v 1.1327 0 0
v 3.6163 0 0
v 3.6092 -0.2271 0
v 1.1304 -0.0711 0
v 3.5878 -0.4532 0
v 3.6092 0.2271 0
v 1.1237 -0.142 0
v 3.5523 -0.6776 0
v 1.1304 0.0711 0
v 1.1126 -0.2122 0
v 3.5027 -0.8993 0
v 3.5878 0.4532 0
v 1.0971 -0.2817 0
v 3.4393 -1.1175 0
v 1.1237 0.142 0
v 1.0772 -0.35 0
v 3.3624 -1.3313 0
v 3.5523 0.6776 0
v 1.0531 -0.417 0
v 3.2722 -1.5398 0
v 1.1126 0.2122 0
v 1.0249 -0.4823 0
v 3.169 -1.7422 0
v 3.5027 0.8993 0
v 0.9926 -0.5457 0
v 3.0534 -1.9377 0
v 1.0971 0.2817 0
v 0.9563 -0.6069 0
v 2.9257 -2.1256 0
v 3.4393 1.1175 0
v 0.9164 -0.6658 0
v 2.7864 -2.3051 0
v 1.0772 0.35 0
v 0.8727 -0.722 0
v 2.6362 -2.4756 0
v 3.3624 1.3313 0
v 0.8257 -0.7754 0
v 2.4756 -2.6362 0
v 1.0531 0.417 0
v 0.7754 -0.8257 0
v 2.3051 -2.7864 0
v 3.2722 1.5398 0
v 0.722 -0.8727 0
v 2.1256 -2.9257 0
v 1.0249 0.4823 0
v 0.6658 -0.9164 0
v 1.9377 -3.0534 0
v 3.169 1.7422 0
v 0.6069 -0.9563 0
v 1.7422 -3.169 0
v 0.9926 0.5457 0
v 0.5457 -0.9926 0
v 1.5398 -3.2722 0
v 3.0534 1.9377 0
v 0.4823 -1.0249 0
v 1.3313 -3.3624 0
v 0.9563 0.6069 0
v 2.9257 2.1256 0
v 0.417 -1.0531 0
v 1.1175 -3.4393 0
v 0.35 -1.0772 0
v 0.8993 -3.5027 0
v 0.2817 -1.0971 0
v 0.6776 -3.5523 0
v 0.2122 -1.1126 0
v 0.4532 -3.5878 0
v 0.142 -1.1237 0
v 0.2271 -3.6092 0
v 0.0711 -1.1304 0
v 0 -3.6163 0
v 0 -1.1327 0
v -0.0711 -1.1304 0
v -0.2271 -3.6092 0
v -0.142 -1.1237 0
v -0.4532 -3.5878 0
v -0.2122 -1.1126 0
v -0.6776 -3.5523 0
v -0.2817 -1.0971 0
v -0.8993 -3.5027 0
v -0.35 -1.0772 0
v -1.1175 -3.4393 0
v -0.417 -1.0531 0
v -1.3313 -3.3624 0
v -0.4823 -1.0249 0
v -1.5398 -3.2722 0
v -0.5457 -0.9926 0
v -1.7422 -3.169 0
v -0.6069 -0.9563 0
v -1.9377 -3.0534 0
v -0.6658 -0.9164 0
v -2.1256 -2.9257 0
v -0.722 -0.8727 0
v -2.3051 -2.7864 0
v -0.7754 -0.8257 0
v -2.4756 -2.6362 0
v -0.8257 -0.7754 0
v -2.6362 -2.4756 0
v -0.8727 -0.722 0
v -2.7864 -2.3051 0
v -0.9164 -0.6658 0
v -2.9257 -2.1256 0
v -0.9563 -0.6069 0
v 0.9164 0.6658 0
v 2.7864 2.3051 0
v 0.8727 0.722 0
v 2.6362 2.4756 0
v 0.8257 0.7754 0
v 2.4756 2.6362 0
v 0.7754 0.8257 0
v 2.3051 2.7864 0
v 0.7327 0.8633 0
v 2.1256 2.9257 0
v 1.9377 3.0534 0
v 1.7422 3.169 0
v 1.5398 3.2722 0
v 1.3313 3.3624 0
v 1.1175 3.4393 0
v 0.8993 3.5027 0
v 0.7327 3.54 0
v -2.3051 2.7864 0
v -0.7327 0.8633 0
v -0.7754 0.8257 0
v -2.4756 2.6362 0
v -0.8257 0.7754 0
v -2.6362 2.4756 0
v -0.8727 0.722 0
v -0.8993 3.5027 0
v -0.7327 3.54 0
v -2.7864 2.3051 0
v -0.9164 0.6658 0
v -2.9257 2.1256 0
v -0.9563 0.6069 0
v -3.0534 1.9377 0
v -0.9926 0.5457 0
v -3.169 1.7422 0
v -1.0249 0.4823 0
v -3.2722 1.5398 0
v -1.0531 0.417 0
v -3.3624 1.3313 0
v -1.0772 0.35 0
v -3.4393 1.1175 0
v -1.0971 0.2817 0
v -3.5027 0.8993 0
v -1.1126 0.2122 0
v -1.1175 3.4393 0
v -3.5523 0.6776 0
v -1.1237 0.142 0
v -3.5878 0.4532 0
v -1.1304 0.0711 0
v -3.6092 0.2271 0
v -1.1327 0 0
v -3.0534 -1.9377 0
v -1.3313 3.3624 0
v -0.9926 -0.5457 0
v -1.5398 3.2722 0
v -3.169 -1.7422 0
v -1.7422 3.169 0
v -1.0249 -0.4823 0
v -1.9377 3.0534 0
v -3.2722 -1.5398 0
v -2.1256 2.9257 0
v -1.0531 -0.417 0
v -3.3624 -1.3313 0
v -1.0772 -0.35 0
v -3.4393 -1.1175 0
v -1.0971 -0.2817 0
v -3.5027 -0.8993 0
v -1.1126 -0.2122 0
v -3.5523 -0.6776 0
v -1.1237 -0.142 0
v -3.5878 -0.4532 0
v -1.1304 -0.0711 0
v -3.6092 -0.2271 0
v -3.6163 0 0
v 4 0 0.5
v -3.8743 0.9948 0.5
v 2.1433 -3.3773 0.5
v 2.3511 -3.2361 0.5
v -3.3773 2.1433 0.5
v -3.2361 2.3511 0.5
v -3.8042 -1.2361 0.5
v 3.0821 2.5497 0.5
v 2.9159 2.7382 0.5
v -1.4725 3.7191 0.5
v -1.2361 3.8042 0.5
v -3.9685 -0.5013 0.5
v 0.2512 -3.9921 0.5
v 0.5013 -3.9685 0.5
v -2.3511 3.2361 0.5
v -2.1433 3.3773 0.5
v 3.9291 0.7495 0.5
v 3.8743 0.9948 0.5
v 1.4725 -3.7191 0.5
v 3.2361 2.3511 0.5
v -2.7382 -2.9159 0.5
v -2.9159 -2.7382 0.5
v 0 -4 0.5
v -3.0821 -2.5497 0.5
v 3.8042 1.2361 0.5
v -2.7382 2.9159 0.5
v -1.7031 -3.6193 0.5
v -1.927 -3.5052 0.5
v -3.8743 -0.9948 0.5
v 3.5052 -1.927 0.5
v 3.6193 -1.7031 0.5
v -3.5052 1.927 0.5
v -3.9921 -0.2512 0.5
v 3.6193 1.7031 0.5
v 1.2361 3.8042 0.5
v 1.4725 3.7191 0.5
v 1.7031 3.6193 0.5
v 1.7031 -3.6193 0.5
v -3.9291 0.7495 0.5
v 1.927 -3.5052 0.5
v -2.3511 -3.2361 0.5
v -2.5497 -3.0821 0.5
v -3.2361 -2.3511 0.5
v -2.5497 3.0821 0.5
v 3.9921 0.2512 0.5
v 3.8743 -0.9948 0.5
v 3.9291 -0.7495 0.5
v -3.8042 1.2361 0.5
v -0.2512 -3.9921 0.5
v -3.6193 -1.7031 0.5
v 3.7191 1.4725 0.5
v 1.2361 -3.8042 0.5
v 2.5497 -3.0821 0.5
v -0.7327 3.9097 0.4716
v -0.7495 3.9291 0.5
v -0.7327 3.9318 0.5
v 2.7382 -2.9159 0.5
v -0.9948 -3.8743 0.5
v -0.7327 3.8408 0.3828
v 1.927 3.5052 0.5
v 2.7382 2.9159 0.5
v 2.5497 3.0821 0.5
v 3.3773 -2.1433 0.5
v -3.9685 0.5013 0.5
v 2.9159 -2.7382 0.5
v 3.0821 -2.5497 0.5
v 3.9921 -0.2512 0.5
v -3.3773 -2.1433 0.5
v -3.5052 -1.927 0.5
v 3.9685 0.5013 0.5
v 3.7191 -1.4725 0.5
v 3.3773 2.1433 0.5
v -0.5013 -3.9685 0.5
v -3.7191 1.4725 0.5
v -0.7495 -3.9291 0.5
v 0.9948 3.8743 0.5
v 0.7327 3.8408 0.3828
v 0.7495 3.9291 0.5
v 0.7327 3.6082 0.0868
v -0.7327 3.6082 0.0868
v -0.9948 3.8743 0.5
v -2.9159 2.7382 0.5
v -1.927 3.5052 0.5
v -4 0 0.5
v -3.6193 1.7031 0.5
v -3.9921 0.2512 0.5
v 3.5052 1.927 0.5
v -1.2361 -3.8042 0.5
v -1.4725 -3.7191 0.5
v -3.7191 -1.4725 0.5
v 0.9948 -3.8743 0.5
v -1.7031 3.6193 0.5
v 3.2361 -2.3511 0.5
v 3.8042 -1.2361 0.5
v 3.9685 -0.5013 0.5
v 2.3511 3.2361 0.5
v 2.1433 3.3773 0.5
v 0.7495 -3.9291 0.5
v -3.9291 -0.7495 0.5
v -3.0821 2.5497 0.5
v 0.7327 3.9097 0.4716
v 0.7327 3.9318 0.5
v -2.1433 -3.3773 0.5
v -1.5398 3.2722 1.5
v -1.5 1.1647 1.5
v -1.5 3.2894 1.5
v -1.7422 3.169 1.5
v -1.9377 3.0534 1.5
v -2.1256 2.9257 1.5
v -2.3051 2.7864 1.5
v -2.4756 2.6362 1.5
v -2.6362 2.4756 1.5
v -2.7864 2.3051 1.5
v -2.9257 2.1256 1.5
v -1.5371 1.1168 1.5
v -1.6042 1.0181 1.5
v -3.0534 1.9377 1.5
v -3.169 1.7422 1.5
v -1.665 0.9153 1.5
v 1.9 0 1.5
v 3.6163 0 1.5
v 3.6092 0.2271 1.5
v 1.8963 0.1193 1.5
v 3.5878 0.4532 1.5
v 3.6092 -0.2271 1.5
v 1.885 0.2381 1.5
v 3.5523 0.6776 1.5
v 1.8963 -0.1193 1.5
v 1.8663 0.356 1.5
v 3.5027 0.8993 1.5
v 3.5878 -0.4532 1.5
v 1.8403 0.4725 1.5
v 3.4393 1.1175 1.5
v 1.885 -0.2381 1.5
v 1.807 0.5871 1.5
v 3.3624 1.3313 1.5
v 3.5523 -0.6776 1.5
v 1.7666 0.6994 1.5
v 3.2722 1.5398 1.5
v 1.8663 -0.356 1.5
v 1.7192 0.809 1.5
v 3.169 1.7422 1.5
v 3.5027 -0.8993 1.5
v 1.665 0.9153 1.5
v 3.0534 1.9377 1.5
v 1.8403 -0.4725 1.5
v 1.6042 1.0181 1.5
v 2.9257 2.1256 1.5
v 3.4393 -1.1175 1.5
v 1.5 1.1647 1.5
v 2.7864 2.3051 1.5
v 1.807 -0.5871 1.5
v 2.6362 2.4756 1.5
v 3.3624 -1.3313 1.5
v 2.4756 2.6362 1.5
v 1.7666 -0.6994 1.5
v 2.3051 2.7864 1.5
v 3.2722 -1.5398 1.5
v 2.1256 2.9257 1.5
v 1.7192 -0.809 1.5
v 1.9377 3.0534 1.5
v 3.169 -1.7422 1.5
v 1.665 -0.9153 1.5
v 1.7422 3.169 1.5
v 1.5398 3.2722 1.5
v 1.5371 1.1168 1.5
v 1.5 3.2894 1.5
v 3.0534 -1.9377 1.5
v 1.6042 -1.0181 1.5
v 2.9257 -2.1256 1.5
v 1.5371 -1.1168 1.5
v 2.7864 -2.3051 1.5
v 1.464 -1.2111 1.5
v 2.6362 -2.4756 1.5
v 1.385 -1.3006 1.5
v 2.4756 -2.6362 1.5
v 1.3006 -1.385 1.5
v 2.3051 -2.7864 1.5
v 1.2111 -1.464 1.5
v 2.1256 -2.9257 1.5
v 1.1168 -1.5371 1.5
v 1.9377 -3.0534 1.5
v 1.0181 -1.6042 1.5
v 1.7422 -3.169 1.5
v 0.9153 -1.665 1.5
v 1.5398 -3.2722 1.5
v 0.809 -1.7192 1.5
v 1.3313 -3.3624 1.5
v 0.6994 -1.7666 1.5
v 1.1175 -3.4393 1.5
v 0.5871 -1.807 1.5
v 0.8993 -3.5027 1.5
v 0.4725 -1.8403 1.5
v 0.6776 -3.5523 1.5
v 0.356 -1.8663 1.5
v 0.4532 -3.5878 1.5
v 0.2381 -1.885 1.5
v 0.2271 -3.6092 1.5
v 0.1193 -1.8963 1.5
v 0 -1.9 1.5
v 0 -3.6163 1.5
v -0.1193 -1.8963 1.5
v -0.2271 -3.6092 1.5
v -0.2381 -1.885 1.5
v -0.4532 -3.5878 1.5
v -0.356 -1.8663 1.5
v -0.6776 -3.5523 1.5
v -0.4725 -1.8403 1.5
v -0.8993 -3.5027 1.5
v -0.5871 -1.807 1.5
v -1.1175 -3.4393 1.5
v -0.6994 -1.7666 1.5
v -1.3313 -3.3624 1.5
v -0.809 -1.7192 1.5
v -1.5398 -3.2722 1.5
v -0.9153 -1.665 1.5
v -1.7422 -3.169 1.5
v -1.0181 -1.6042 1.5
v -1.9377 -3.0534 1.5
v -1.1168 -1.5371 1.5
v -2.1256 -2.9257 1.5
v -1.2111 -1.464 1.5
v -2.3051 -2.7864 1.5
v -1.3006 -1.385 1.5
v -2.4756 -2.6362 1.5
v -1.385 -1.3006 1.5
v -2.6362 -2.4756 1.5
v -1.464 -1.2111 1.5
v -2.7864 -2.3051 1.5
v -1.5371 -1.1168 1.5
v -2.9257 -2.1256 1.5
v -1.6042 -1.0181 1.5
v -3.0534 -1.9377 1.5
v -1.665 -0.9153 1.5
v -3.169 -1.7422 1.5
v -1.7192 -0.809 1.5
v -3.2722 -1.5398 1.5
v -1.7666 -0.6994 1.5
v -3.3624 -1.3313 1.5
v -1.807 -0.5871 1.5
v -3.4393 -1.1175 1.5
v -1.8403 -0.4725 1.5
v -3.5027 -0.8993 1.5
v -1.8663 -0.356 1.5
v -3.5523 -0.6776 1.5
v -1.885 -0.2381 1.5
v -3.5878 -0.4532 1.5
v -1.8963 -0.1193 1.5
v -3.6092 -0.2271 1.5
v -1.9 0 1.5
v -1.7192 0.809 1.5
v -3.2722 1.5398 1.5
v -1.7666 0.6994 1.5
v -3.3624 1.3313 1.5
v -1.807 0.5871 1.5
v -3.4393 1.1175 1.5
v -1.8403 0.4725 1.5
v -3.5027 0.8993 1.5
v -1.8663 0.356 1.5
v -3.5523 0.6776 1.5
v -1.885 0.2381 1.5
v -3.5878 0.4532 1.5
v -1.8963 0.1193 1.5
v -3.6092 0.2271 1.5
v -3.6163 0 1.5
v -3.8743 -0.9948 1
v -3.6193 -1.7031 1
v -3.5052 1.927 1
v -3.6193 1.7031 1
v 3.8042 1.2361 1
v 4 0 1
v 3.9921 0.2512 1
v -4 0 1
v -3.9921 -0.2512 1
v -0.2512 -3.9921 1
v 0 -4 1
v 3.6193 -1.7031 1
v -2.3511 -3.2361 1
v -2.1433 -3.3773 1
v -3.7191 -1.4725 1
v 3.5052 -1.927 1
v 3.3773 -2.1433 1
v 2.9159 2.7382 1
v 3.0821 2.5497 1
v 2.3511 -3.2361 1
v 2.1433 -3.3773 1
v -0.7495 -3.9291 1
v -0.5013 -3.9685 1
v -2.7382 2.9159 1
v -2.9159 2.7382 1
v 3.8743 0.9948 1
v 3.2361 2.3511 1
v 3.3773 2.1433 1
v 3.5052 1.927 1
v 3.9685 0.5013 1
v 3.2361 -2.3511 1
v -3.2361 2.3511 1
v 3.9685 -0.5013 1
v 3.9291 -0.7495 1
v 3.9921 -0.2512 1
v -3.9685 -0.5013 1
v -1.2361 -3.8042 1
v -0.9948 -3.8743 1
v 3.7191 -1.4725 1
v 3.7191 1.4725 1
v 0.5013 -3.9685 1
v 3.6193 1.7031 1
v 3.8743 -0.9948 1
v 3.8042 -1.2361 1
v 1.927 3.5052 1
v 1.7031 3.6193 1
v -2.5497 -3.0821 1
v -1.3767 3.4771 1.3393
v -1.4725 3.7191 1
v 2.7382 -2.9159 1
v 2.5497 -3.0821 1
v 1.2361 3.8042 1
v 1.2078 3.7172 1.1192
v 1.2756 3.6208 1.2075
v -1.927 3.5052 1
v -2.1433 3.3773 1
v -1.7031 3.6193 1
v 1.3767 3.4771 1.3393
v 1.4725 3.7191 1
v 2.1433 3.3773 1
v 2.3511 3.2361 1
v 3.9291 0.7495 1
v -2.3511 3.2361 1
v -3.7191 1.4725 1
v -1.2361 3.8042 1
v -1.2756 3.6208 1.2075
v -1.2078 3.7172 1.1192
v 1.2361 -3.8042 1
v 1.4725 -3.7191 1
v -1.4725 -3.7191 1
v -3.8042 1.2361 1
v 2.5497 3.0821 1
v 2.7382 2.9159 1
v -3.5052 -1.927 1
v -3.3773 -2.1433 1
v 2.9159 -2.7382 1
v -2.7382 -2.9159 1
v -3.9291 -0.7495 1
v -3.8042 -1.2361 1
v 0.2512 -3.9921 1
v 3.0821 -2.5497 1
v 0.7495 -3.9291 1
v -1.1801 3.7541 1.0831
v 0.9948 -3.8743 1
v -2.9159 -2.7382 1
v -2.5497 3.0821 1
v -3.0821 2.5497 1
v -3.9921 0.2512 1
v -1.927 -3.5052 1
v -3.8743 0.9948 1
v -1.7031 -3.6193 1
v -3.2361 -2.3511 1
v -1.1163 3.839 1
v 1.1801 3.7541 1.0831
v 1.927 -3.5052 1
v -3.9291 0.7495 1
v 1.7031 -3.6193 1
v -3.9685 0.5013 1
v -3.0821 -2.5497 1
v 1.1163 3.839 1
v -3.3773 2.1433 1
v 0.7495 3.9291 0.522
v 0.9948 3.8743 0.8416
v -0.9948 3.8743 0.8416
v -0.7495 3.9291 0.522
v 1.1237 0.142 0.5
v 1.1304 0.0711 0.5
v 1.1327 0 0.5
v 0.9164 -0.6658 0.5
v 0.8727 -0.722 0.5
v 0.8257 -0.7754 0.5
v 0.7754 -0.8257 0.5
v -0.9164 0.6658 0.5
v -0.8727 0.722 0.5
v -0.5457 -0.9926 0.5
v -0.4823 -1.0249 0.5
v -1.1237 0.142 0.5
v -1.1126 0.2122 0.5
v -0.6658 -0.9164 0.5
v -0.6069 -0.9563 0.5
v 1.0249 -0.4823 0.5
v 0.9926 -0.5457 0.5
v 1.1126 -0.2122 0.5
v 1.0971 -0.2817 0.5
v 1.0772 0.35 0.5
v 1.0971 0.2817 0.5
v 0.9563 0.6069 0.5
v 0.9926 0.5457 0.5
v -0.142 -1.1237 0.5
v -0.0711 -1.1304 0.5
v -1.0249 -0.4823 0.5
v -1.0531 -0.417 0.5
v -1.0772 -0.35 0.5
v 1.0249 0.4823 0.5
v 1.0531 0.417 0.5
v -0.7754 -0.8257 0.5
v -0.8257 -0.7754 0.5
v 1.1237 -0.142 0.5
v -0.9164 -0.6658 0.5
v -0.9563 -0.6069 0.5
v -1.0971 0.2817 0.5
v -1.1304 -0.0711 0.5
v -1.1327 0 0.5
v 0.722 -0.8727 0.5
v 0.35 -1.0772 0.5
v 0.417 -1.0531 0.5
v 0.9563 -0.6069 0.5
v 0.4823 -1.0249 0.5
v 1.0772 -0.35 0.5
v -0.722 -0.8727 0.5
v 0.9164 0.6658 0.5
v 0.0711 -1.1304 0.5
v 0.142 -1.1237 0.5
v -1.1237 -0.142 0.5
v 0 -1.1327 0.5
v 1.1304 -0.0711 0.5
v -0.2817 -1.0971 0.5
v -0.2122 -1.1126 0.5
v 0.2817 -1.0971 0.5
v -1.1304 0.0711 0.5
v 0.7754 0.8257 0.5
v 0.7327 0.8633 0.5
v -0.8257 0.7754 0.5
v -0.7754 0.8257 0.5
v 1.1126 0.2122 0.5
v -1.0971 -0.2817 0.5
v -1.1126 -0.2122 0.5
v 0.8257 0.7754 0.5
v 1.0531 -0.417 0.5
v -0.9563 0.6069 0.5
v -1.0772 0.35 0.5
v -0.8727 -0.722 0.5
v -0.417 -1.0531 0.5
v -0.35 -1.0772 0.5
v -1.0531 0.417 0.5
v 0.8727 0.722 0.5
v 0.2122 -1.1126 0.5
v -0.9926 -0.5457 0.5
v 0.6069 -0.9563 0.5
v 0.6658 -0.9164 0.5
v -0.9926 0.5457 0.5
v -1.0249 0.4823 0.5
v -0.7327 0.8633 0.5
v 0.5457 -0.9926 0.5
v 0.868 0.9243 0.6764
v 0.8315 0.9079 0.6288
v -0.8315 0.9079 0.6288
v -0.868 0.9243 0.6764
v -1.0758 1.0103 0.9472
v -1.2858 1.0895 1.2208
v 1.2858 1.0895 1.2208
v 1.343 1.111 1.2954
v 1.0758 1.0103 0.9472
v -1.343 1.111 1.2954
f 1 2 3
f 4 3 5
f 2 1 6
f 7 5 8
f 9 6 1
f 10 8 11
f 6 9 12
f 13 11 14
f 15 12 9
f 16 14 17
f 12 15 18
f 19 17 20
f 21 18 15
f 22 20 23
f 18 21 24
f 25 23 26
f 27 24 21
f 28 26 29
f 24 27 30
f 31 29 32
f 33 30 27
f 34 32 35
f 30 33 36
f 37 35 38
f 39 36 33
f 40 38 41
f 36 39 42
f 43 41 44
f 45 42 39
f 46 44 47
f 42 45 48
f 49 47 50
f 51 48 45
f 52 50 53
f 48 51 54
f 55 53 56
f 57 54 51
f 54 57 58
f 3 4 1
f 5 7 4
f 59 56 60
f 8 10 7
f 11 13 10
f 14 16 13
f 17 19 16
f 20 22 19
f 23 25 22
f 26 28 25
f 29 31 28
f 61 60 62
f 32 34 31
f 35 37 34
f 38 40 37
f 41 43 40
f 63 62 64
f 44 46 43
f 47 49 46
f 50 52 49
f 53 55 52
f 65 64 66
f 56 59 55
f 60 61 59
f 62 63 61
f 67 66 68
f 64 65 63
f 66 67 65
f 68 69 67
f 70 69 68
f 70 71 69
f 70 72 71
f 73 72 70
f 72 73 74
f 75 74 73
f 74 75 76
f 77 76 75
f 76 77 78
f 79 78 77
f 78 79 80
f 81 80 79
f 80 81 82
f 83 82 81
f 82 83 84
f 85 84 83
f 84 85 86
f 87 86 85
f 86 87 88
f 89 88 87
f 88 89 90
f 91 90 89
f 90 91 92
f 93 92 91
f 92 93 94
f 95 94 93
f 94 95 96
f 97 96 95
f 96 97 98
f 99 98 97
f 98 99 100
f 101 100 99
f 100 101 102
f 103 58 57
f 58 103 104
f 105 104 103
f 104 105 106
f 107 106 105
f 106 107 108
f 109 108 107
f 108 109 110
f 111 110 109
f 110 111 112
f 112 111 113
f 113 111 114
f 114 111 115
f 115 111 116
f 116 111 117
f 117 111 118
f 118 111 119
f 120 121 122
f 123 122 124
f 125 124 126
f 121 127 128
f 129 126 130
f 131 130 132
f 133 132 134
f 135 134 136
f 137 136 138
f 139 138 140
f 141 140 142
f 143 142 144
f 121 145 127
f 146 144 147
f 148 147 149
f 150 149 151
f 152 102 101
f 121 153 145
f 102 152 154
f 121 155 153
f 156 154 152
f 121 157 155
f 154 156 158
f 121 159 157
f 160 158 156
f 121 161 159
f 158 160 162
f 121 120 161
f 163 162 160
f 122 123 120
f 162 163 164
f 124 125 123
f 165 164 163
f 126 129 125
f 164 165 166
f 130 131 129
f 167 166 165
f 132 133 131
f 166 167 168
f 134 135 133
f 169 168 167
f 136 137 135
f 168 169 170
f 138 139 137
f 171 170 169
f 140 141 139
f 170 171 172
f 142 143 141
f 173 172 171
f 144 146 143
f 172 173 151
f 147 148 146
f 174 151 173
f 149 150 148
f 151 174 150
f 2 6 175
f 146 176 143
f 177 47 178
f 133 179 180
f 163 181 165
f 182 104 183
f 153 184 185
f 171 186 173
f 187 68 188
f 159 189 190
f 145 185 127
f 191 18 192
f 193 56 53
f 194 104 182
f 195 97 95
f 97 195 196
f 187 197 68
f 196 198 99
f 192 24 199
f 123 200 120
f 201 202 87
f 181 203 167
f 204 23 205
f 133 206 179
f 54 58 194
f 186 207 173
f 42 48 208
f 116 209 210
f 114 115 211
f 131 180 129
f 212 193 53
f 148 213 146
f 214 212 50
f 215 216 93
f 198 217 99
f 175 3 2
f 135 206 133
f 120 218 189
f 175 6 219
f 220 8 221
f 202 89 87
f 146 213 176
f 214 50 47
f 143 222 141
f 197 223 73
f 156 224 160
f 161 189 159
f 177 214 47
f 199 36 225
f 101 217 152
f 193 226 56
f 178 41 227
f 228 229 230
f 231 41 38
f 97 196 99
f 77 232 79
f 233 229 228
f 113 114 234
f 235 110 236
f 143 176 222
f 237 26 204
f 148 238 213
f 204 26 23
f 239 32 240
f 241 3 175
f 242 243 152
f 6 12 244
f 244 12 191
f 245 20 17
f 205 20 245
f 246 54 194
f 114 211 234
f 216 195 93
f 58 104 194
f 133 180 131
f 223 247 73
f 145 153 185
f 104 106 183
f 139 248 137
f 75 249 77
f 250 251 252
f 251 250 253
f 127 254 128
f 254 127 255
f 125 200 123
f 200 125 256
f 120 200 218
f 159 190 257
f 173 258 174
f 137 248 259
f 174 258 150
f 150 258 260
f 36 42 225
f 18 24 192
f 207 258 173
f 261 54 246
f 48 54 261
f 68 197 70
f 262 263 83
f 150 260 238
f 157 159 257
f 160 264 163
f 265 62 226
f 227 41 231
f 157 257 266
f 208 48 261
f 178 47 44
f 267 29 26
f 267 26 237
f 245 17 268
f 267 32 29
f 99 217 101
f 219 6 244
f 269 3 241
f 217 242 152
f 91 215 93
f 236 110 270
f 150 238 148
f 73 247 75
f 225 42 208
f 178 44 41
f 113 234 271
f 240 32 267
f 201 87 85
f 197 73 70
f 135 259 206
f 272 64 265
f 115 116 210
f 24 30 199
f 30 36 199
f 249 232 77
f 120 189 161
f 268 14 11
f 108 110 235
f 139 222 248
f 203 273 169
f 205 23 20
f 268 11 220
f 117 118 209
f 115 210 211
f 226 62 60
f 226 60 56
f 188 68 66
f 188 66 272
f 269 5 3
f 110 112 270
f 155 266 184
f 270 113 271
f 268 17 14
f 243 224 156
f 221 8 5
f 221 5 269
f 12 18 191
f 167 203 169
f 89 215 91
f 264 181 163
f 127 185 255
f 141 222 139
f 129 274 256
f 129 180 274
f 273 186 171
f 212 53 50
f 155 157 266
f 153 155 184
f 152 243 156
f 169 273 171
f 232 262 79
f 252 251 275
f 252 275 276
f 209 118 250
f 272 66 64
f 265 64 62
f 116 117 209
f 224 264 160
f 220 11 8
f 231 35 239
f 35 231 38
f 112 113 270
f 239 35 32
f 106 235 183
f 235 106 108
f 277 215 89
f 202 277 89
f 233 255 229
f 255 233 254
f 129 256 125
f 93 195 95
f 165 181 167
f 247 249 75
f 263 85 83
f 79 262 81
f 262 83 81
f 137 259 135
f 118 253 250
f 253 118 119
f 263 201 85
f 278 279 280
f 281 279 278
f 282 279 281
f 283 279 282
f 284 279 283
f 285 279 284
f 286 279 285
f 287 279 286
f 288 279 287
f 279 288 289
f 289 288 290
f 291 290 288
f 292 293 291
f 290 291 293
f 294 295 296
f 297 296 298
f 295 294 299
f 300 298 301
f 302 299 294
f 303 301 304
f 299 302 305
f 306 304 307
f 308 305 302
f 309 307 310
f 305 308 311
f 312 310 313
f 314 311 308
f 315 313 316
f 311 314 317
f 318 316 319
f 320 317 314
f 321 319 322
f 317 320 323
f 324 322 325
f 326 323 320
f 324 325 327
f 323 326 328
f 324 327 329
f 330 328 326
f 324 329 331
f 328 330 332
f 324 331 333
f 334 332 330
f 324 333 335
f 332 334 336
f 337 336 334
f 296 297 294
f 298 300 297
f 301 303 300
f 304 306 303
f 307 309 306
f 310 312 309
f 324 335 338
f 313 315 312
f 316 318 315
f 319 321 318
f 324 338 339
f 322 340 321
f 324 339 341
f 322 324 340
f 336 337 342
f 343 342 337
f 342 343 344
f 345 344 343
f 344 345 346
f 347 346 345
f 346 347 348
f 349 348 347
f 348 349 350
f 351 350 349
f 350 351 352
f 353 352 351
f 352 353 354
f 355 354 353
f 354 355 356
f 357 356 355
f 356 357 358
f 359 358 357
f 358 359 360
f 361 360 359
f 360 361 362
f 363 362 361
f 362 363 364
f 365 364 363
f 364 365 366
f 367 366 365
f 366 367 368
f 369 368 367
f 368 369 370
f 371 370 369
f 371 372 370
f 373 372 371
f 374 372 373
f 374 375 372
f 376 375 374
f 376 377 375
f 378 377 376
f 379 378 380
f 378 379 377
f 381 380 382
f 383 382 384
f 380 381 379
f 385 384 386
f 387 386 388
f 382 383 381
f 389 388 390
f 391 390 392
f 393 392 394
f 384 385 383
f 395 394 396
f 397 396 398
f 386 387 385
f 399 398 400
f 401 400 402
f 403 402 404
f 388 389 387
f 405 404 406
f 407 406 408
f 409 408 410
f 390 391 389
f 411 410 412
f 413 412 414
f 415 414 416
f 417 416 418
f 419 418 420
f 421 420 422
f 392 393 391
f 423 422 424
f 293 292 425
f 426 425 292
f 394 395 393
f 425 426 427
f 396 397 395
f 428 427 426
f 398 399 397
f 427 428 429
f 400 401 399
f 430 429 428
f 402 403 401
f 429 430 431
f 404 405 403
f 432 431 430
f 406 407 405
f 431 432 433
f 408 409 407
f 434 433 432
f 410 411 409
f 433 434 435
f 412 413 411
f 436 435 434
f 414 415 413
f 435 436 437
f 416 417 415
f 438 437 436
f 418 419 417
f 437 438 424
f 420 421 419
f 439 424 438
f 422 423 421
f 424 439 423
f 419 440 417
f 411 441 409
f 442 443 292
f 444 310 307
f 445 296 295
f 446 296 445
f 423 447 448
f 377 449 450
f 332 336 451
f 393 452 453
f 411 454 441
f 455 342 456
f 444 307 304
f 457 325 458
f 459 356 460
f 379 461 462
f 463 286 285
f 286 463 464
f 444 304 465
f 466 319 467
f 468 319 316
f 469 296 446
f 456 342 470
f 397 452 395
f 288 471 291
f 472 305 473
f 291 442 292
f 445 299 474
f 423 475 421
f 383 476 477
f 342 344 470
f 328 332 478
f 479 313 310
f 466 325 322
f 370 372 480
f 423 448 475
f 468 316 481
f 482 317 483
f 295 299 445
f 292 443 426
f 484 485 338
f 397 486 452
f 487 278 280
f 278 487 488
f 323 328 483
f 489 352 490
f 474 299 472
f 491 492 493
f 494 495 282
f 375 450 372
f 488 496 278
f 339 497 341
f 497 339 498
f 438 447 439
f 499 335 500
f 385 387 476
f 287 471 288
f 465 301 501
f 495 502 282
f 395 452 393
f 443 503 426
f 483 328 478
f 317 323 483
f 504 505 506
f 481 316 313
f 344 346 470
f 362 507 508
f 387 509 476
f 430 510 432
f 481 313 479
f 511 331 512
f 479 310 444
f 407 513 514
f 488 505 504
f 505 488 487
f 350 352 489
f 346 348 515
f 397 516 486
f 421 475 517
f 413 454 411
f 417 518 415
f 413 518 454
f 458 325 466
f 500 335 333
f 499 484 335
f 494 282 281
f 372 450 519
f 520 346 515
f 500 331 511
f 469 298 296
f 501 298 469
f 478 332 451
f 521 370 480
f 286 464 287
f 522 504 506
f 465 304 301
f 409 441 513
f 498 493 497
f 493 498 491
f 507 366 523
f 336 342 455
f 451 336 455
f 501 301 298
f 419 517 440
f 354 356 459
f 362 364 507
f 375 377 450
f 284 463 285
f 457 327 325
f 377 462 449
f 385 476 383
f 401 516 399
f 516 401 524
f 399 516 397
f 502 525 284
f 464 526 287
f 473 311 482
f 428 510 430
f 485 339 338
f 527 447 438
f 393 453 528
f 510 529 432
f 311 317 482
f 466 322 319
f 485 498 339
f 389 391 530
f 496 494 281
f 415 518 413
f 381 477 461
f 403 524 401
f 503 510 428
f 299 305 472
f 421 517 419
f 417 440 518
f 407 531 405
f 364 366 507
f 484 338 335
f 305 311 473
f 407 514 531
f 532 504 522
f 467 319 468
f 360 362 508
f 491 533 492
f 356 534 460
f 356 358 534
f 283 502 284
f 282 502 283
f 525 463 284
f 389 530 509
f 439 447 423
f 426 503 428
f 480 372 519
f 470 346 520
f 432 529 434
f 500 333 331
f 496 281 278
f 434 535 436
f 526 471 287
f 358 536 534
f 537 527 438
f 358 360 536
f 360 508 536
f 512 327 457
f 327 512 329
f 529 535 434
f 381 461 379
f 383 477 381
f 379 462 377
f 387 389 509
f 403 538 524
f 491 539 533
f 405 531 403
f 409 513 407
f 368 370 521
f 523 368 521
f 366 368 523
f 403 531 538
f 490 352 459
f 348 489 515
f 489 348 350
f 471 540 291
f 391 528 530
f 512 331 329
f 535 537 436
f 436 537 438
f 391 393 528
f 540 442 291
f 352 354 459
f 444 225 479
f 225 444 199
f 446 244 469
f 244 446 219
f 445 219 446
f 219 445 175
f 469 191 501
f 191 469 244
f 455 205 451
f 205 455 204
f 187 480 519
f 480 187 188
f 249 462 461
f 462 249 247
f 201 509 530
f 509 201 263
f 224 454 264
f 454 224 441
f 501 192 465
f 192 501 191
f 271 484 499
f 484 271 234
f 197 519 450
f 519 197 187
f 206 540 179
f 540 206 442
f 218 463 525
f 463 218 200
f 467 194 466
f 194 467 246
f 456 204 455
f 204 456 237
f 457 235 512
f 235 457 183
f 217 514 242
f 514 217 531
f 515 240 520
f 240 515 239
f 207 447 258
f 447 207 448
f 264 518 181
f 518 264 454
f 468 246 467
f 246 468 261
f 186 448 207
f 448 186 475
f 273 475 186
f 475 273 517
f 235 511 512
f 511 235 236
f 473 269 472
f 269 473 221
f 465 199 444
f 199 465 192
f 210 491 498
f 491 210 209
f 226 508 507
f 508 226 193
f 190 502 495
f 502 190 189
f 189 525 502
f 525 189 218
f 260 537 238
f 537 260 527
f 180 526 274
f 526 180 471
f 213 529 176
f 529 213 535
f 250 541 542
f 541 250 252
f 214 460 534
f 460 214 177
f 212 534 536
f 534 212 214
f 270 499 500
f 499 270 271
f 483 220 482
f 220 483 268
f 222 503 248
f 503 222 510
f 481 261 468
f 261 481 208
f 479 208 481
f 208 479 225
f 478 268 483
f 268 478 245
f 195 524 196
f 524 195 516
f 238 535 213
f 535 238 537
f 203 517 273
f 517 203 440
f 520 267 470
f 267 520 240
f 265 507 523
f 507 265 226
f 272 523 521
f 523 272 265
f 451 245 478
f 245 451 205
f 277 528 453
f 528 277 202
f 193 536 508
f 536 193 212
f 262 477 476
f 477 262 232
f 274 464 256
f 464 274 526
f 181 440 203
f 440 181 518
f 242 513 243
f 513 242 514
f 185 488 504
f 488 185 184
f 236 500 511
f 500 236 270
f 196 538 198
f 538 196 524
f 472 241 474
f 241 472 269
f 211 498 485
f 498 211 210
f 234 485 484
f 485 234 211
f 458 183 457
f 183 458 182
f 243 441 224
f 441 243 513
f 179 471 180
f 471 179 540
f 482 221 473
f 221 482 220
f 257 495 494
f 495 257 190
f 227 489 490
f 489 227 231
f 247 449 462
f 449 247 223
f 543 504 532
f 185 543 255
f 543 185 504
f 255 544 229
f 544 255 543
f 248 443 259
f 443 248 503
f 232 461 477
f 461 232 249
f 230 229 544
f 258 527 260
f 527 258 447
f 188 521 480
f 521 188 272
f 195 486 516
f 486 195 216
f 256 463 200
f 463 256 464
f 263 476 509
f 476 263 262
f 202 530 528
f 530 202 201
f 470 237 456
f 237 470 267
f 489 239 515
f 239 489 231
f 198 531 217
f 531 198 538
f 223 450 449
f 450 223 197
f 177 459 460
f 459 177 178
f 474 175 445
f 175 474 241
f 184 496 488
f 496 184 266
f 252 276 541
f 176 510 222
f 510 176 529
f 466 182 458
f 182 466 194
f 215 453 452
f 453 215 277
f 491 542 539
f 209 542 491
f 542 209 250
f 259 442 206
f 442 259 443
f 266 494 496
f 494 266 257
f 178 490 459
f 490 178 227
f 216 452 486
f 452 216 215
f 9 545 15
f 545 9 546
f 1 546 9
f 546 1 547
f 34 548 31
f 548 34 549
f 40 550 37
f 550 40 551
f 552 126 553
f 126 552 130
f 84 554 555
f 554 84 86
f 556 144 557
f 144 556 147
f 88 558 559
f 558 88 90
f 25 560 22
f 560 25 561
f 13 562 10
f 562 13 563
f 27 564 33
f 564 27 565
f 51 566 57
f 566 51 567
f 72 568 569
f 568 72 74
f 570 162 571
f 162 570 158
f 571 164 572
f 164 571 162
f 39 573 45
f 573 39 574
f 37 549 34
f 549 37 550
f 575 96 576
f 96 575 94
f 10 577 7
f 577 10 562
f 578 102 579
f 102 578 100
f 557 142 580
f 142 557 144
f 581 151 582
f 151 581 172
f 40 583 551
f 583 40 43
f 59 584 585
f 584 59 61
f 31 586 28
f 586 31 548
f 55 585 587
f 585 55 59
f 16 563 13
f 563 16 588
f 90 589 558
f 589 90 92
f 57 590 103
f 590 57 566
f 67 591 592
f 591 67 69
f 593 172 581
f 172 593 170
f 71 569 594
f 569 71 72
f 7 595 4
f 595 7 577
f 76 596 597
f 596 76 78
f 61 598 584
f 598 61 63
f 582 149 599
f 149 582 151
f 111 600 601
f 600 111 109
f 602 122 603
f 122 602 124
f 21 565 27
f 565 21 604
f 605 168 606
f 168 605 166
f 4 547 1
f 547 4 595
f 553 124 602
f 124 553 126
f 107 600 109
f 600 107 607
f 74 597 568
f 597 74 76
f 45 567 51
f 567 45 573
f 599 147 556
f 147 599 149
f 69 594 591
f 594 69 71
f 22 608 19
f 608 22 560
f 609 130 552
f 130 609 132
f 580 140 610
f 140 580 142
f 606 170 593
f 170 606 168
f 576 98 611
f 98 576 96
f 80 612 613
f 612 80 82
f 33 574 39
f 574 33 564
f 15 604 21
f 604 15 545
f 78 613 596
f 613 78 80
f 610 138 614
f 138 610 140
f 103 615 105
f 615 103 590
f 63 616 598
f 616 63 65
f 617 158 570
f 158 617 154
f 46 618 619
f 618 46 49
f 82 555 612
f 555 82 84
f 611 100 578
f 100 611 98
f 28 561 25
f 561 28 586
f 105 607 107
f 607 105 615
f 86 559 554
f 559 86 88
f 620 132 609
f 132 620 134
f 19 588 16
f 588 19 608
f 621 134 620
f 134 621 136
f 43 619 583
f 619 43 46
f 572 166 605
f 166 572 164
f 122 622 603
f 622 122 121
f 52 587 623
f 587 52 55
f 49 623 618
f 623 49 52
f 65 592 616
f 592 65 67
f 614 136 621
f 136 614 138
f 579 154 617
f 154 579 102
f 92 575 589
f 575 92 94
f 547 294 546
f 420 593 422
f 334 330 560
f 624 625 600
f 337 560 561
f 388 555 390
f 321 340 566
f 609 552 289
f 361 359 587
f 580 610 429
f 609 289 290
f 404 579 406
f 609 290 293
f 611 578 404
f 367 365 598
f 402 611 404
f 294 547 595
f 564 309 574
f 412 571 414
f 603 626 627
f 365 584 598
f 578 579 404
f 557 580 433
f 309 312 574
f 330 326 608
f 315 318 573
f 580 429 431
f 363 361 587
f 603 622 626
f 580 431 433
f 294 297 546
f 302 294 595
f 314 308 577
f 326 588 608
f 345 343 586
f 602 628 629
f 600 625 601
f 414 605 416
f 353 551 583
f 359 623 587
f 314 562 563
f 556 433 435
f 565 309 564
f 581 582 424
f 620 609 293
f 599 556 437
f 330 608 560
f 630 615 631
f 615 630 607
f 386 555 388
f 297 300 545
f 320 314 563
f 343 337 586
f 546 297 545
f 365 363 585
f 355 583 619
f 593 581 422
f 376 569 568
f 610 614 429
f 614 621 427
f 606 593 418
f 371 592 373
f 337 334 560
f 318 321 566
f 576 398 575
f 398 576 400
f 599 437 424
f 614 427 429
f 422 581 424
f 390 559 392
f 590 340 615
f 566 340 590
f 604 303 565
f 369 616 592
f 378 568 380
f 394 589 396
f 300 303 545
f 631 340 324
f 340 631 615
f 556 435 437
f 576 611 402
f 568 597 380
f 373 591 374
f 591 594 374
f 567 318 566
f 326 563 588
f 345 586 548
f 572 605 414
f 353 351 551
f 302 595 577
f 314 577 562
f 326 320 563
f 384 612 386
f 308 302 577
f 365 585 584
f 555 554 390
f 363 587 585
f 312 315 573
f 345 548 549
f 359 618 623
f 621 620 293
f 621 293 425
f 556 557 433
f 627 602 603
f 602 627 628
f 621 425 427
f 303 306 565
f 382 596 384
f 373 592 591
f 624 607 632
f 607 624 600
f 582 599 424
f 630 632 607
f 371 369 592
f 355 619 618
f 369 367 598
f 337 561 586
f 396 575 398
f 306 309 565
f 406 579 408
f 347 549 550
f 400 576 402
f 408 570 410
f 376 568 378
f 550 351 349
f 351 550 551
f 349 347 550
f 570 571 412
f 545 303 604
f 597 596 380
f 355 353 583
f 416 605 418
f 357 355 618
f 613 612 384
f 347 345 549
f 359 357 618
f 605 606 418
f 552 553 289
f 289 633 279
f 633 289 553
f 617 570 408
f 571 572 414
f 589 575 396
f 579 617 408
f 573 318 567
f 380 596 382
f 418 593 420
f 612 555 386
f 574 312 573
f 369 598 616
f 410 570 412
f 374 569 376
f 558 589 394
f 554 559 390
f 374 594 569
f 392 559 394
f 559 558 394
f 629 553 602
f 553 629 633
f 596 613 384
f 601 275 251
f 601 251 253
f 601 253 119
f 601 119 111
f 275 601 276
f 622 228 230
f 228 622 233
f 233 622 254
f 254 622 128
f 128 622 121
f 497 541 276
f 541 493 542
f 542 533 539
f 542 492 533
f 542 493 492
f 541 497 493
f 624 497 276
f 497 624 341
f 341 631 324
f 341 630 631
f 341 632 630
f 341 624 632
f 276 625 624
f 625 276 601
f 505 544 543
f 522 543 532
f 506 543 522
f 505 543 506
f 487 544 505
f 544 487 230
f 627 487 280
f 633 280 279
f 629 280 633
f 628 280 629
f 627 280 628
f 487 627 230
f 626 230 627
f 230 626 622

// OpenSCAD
//Outer radius of the peg the clip will attach to
pegRadius = 1.75;
//Clearance between the peg and the inner radius of the clip
clearance = .15;
//Outer radius of the clip.  If it's less than or equal to your peg radius, your clip isn't going to hold much.
outerRadius = 4;
//Thickness of the clip.
thickness = 1.5;
//Bevel angle from vertical of the clip and peg notch.  The steeper the angle, the more holding power and thinner notch in your peg, but the harder it is to print the peg without support.  Supports are bad.
bevelAngle = 37.5;
//Thickness of the clip before it starts beveling.  This can be 0 for a sharp-edged clip, or greater than the thickness for a clip with no bevel at all.
bevelStart = .5;
//This is how much the "wings" overlap the solid portion of the peg.  Too much and your clip may not be flexible enough to open and go into place.  Less than clearance and the clip can just fall off.  You only need enough wraparound to keep the clip from coming off during normal useage and still be removable by hand (or tool).
wrapAround = .4;
//This chamfers the outside edge, easing the top and bottom corners and making removal from the bed easier.
chamferAngle = 37.5;
chamferHeight = .5;

offset = ((thickness-bevelStart) / tan((90-bevelAngle)));

innerRadius = (pegRadius - offset) + clearance;
iR2 = innerRadius + offset;
//1.56321 - .1;

chamferWidth = (chamferHeight) / tan(90-chamferAngle);

//Number of sides to make it "round".  I like very round, so I use 100, but less round renders faster.
$fn=100;

//jump = 10*ceil(outerRadius * 3 / 10);

difference() {
	cylinder(
		h=thickness,
		r=outerRadius
	);
	cylinder(
		h=thickness,
		r=innerRadius
	);
	translate([0, 0, bevelStart]){
		cylinder(
			h=thickness - bevelStart,
			r1=innerRadius,
			r2=iR2
		);
	};
	translate([0, outerRadius/2, thickness/2]) {
		cube(
			size=[(innerRadius-wrapAround)*2,outerRadius,thickness],
			center=true
		);
	};
	polyhedron(
		points=[
			[-(innerRadius-wrapAround), 0, bevelStart],
			[-(innerRadius-wrapAround + offset), 0, thickness],
			[(innerRadius-wrapAround)+offset, 0, thickness],
			[innerRadius-wrapAround, 0, bevelStart],
			[-(innerRadius-wrapAround), outerRadius, bevelStart],
			[-(innerRadius-wrapAround + offset), outerRadius, thickness],
			[(innerRadius-wrapAround)+offset, outerRadius, thickness],
			[innerRadius-wrapAround, outerRadius, bevelStart]
		],
		faces=[
			[0,1,2,3],
			[7,6,5,4],
			[1,5,6,2],
			[3,7,4,0],
			[0,4,5,1],
			[2,6,7,3]
		]
	);
	difference() {
		cylinder(
			h=chamferHeight,
			r=outerRadius*2
		);
		cylinder(
			h=chamferHeight,
			r1=outerRadius - chamferWidth,
			r2=outerRadius
		);
	};
	translate([0,0,thickness-chamferHeight]) {
		difference() {
			cylinder(
				h=chamferHeight,
				r=outerRadius*2
			);
			cylinder(
				h=chamferHeight,
				r1=outerRadius,
				r2=outerRadius - chamferWidth
			);
		}
	};
}
